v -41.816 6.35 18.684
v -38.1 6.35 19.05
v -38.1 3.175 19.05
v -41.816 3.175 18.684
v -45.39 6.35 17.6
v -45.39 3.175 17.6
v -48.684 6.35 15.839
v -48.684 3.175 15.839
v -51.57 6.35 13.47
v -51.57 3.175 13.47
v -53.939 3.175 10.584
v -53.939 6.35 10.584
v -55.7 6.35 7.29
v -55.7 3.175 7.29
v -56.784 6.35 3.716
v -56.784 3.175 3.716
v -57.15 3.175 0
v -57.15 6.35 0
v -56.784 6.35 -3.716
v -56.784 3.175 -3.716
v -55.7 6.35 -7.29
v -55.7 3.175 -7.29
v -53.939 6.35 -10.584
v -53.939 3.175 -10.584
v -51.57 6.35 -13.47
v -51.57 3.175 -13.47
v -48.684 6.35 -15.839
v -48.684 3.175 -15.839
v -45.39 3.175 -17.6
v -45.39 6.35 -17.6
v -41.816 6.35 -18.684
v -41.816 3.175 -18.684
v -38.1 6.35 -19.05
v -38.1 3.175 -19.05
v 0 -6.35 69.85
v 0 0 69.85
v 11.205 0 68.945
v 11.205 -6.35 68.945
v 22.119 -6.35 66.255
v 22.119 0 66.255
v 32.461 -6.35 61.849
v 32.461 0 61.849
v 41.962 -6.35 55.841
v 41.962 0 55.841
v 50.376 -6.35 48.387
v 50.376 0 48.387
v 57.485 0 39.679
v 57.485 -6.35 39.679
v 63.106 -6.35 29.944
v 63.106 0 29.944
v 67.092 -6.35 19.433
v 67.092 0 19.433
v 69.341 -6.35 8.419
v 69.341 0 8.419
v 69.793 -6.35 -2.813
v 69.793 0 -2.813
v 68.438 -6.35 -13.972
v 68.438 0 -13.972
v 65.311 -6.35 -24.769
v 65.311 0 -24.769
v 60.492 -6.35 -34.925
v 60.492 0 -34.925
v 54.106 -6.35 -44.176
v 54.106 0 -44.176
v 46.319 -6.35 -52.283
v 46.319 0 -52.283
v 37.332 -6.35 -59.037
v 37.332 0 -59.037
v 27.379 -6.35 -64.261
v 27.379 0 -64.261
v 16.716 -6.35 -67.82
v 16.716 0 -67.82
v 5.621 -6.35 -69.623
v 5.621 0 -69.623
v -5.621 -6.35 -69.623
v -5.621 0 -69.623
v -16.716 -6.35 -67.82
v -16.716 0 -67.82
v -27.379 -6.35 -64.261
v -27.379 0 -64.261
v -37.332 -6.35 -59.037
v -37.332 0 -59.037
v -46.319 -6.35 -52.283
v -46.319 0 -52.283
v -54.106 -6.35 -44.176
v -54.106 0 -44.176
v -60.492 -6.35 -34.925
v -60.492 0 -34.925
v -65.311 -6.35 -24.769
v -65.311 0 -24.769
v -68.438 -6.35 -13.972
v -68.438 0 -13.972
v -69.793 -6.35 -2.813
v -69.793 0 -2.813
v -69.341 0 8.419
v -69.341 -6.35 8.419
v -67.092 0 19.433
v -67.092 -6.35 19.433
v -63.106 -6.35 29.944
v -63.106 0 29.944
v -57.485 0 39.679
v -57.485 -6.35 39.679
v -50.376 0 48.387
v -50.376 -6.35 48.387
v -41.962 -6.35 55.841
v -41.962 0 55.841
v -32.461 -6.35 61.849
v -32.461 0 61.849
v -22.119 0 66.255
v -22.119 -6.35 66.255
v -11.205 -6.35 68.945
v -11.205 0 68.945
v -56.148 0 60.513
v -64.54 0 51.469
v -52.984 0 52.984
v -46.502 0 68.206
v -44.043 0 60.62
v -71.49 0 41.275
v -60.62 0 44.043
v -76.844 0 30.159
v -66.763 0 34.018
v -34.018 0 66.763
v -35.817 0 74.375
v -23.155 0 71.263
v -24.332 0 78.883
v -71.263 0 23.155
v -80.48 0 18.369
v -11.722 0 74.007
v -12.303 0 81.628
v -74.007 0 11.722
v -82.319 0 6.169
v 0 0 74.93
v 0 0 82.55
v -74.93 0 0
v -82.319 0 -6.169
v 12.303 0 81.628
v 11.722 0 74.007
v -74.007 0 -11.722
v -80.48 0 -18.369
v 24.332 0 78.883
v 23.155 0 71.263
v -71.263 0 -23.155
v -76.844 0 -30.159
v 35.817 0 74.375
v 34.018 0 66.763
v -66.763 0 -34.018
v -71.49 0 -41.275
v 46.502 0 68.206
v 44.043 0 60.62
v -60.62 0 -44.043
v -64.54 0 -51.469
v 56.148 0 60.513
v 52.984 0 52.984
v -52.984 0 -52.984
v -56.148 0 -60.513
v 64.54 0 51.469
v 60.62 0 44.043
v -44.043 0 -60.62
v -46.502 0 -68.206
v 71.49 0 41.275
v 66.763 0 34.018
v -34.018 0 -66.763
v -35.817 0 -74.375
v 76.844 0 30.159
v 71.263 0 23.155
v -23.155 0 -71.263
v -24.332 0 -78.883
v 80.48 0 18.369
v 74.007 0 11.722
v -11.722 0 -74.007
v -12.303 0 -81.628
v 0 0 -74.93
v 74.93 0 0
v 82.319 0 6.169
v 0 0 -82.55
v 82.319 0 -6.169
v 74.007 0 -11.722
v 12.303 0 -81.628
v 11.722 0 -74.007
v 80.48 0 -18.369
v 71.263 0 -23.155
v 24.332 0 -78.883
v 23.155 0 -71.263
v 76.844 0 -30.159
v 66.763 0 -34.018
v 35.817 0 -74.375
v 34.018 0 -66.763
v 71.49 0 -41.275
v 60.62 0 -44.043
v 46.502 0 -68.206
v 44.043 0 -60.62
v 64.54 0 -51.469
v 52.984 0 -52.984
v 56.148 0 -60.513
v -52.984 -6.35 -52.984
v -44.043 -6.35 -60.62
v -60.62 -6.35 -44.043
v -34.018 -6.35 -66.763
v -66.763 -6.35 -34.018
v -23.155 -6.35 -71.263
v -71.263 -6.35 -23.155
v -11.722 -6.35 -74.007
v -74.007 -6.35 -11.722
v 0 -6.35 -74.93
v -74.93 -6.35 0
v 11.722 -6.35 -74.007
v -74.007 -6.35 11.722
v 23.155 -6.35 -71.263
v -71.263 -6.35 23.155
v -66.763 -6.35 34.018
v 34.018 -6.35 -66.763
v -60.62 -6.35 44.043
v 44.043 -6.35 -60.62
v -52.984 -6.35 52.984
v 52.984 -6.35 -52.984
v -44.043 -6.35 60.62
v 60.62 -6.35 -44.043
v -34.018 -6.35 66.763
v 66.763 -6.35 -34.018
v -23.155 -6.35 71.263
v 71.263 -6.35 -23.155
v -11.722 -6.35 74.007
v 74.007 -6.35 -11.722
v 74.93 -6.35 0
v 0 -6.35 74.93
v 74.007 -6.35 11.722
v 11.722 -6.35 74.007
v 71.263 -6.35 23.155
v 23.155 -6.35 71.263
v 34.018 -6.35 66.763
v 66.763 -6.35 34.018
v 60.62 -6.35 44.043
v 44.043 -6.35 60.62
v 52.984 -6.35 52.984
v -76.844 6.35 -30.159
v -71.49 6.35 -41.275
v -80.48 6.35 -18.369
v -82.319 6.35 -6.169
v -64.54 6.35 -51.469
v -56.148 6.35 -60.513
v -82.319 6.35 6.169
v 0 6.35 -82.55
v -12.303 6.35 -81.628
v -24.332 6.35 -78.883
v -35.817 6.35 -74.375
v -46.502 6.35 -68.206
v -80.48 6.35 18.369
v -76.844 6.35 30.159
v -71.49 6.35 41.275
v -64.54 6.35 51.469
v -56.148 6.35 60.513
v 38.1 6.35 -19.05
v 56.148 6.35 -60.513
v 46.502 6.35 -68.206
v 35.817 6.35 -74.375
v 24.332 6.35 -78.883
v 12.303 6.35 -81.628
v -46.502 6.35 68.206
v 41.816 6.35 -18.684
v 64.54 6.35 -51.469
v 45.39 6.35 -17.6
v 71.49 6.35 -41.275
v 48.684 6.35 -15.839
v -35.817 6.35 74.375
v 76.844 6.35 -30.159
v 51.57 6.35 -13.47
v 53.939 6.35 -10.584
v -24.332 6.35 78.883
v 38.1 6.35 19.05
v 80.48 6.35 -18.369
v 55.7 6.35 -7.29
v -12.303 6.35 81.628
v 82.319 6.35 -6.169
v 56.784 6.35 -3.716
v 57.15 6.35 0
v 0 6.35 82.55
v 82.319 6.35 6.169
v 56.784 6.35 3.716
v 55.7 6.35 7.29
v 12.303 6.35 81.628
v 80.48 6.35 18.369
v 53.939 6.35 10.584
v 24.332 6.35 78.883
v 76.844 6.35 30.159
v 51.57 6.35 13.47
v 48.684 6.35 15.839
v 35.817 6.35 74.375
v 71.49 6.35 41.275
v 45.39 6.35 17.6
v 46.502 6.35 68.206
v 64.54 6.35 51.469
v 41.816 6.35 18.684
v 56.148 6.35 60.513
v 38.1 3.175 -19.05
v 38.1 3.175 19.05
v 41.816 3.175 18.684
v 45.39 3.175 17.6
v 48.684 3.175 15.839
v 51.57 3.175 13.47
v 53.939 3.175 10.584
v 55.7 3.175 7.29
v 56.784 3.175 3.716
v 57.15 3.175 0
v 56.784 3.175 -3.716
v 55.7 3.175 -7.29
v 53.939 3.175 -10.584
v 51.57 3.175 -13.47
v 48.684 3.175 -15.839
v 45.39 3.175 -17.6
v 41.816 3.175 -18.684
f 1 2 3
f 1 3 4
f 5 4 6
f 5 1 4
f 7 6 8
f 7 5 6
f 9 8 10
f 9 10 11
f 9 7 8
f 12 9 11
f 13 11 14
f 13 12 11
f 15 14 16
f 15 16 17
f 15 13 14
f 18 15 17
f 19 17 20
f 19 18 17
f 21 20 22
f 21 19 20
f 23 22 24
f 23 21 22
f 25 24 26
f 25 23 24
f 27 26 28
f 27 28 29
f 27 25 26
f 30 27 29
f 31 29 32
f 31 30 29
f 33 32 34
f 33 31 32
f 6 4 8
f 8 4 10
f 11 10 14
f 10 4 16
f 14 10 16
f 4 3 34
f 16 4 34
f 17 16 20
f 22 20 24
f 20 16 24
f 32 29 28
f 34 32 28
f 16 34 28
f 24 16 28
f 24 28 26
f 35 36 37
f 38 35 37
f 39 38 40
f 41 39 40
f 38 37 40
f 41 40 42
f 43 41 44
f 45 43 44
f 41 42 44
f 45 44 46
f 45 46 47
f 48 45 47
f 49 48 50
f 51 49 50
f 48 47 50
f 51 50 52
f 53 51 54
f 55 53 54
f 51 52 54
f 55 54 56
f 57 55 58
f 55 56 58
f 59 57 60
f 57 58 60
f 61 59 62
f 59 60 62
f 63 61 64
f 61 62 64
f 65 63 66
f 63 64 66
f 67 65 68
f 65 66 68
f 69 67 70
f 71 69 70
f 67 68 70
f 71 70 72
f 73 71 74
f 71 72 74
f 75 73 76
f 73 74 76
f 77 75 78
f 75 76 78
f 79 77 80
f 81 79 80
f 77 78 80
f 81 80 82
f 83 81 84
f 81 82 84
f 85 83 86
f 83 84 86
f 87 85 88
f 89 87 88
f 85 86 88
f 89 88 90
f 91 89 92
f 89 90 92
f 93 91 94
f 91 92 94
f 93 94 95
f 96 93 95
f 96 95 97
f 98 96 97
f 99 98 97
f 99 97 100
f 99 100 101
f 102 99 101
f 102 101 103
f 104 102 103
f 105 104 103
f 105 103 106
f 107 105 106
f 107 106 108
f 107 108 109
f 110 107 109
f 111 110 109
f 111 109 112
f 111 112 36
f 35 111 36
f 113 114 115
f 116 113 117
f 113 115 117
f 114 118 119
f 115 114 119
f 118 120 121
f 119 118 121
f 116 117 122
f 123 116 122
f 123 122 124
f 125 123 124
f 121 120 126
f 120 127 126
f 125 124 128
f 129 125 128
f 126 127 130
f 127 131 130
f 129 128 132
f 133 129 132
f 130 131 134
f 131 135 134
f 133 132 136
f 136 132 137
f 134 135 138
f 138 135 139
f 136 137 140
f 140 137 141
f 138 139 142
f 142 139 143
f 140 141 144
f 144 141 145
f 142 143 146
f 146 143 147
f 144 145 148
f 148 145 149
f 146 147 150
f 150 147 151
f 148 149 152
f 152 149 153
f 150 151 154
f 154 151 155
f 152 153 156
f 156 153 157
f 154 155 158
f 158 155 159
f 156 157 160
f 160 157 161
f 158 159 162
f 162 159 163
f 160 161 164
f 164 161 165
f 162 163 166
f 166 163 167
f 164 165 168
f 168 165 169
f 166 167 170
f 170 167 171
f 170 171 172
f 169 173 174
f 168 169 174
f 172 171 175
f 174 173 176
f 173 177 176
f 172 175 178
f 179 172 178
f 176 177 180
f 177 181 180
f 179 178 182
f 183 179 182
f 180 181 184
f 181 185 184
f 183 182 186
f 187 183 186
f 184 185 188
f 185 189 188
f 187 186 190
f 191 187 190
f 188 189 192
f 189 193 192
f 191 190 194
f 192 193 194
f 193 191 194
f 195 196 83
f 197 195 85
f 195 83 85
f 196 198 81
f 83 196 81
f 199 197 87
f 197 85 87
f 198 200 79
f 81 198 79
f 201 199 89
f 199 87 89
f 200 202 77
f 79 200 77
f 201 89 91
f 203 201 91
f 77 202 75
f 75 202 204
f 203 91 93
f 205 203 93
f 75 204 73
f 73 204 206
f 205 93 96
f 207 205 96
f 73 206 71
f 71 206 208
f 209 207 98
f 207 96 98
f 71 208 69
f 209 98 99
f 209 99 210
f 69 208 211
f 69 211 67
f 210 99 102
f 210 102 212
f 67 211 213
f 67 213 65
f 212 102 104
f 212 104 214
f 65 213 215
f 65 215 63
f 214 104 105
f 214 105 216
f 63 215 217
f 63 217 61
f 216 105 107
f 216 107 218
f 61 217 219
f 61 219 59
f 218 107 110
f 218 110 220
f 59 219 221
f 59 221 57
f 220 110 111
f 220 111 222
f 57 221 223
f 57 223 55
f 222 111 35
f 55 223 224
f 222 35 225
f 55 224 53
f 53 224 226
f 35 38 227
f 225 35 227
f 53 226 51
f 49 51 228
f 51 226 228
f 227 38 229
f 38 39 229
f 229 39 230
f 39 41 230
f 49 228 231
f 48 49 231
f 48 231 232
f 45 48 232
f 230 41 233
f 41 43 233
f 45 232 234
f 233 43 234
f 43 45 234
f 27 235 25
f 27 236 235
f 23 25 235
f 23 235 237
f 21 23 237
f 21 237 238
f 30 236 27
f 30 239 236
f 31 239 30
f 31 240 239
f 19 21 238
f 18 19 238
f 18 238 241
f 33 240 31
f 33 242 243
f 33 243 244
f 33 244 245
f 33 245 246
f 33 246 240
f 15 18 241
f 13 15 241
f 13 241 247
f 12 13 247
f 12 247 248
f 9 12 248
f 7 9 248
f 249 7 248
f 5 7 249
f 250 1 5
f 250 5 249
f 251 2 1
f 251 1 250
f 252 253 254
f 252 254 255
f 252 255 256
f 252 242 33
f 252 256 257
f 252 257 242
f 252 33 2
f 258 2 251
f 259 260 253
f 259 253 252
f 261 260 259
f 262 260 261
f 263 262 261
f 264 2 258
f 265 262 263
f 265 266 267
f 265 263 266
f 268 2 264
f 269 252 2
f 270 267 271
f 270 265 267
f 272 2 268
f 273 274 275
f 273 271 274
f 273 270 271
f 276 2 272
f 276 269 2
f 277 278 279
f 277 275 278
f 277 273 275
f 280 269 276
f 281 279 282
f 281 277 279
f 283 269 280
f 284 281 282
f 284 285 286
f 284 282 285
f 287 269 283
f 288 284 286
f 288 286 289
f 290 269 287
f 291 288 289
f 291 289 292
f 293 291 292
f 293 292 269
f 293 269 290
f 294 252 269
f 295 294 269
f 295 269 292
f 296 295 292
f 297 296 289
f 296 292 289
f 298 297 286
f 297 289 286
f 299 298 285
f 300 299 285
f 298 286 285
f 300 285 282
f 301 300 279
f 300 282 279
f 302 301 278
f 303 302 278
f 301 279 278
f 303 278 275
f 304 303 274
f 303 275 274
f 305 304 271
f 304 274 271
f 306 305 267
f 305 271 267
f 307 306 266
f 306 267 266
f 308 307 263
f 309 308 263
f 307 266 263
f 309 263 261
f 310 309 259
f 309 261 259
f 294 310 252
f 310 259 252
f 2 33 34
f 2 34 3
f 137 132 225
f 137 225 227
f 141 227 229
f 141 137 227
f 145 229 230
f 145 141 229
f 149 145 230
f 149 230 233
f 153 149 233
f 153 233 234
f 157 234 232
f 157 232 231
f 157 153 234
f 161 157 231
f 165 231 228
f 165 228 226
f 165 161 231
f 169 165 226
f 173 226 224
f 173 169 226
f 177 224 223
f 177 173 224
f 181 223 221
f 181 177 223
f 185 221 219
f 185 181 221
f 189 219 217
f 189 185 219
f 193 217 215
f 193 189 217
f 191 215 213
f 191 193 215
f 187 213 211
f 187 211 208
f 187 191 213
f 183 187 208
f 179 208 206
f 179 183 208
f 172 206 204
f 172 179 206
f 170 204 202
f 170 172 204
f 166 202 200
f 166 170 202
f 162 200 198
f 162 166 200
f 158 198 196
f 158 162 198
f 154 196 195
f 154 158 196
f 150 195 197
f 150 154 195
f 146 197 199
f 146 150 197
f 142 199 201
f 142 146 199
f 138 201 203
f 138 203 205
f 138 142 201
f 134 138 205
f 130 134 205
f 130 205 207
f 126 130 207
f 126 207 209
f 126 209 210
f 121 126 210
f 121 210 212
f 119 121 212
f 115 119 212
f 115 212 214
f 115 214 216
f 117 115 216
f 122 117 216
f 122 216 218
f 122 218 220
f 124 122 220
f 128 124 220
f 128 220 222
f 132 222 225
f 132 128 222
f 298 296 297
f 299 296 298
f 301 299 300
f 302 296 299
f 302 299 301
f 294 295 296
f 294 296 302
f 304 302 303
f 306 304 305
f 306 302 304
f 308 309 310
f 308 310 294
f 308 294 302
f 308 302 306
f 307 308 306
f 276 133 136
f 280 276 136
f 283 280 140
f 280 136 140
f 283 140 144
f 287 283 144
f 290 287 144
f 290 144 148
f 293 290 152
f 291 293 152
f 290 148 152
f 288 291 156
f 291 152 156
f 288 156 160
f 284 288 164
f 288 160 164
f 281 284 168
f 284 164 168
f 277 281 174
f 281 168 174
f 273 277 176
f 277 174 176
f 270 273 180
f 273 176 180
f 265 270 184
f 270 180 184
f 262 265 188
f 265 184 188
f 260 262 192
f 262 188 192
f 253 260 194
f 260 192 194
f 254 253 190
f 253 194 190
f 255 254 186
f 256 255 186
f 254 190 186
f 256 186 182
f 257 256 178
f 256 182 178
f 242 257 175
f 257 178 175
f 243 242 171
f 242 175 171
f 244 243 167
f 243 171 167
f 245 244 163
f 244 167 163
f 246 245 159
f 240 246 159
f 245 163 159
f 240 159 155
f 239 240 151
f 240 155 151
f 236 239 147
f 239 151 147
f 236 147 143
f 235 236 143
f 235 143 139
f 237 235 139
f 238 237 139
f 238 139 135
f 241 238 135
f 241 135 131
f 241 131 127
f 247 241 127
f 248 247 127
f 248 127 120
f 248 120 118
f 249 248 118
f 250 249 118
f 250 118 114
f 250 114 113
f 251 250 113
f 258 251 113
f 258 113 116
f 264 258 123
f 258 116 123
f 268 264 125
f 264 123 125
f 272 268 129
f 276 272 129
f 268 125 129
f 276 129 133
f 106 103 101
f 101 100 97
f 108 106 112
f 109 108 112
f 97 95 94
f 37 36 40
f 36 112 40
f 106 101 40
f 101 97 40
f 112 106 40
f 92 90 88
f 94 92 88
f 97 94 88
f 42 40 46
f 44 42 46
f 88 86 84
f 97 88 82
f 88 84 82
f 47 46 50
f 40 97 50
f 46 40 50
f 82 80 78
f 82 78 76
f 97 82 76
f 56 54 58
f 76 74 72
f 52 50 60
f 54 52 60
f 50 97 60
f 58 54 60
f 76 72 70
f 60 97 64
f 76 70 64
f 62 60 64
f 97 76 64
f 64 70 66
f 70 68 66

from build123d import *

# Parameters (mm, degrees)
SKETCH1_R           = 82.55
BOSS_EXTRUDE2_DEPTH = 6.35
SKETCH1_4_R         = 74.93
SKETCH1_4_R_2       = 69.85
BOSS_EXTRUDE3_DEPTH = 6.35
CUT_EXTRUDE1_DEPTH  = 3.175


with BuildPart() as part:
    # Sketch1 → Boss-Extrude2 (new body)
    with BuildSketch(Plane(origin=(0, 0, 0), x_dir=(1, 0, 0), z_dir=(0, 1, 0))):
        Circle(SKETCH1_R)
    extrude(amount=BOSS_EXTRUDE2_DEPTH)

    # Sketch1<4> → Boss-Extrude3 (add)
    with BuildSketch(Plane(origin=(0, 0, 0), x_dir=(1, 0, 0), z_dir=(0, 1, 0))):
        Circle(SKETCH1_4_R)
        Circle(SKETCH1_4_R_2, mode=Mode.SUBTRACT)
    extrude(amount=-BOSS_EXTRUDE3_DEPTH)

    # Sketch2 → Cut-Extrude1 (cut)
    with BuildSketch(Plane(origin=(0, 6.35, 0), x_dir=(1, 0, 0), z_dir=(0, 1, 0))):
        with BuildLine():
            Line((-38.1, 19.05), (-38.1, -19.05))
            ThreePointArc((-38.1, -19.05), (-57.15, 0), (-38.1, 19.05))
        make_face()
        with BuildLine():
            Line((38.1, 19.05), (38.1, -19.05))
            ThreePointArc((38.1, -19.05), (57.15, 0), (38.1, 19.05))
        make_face()
    extrude(amount=-CUT_EXTRUDE1_DEPTH, mode=Mode.SUBTRACT)


solid = part.part
